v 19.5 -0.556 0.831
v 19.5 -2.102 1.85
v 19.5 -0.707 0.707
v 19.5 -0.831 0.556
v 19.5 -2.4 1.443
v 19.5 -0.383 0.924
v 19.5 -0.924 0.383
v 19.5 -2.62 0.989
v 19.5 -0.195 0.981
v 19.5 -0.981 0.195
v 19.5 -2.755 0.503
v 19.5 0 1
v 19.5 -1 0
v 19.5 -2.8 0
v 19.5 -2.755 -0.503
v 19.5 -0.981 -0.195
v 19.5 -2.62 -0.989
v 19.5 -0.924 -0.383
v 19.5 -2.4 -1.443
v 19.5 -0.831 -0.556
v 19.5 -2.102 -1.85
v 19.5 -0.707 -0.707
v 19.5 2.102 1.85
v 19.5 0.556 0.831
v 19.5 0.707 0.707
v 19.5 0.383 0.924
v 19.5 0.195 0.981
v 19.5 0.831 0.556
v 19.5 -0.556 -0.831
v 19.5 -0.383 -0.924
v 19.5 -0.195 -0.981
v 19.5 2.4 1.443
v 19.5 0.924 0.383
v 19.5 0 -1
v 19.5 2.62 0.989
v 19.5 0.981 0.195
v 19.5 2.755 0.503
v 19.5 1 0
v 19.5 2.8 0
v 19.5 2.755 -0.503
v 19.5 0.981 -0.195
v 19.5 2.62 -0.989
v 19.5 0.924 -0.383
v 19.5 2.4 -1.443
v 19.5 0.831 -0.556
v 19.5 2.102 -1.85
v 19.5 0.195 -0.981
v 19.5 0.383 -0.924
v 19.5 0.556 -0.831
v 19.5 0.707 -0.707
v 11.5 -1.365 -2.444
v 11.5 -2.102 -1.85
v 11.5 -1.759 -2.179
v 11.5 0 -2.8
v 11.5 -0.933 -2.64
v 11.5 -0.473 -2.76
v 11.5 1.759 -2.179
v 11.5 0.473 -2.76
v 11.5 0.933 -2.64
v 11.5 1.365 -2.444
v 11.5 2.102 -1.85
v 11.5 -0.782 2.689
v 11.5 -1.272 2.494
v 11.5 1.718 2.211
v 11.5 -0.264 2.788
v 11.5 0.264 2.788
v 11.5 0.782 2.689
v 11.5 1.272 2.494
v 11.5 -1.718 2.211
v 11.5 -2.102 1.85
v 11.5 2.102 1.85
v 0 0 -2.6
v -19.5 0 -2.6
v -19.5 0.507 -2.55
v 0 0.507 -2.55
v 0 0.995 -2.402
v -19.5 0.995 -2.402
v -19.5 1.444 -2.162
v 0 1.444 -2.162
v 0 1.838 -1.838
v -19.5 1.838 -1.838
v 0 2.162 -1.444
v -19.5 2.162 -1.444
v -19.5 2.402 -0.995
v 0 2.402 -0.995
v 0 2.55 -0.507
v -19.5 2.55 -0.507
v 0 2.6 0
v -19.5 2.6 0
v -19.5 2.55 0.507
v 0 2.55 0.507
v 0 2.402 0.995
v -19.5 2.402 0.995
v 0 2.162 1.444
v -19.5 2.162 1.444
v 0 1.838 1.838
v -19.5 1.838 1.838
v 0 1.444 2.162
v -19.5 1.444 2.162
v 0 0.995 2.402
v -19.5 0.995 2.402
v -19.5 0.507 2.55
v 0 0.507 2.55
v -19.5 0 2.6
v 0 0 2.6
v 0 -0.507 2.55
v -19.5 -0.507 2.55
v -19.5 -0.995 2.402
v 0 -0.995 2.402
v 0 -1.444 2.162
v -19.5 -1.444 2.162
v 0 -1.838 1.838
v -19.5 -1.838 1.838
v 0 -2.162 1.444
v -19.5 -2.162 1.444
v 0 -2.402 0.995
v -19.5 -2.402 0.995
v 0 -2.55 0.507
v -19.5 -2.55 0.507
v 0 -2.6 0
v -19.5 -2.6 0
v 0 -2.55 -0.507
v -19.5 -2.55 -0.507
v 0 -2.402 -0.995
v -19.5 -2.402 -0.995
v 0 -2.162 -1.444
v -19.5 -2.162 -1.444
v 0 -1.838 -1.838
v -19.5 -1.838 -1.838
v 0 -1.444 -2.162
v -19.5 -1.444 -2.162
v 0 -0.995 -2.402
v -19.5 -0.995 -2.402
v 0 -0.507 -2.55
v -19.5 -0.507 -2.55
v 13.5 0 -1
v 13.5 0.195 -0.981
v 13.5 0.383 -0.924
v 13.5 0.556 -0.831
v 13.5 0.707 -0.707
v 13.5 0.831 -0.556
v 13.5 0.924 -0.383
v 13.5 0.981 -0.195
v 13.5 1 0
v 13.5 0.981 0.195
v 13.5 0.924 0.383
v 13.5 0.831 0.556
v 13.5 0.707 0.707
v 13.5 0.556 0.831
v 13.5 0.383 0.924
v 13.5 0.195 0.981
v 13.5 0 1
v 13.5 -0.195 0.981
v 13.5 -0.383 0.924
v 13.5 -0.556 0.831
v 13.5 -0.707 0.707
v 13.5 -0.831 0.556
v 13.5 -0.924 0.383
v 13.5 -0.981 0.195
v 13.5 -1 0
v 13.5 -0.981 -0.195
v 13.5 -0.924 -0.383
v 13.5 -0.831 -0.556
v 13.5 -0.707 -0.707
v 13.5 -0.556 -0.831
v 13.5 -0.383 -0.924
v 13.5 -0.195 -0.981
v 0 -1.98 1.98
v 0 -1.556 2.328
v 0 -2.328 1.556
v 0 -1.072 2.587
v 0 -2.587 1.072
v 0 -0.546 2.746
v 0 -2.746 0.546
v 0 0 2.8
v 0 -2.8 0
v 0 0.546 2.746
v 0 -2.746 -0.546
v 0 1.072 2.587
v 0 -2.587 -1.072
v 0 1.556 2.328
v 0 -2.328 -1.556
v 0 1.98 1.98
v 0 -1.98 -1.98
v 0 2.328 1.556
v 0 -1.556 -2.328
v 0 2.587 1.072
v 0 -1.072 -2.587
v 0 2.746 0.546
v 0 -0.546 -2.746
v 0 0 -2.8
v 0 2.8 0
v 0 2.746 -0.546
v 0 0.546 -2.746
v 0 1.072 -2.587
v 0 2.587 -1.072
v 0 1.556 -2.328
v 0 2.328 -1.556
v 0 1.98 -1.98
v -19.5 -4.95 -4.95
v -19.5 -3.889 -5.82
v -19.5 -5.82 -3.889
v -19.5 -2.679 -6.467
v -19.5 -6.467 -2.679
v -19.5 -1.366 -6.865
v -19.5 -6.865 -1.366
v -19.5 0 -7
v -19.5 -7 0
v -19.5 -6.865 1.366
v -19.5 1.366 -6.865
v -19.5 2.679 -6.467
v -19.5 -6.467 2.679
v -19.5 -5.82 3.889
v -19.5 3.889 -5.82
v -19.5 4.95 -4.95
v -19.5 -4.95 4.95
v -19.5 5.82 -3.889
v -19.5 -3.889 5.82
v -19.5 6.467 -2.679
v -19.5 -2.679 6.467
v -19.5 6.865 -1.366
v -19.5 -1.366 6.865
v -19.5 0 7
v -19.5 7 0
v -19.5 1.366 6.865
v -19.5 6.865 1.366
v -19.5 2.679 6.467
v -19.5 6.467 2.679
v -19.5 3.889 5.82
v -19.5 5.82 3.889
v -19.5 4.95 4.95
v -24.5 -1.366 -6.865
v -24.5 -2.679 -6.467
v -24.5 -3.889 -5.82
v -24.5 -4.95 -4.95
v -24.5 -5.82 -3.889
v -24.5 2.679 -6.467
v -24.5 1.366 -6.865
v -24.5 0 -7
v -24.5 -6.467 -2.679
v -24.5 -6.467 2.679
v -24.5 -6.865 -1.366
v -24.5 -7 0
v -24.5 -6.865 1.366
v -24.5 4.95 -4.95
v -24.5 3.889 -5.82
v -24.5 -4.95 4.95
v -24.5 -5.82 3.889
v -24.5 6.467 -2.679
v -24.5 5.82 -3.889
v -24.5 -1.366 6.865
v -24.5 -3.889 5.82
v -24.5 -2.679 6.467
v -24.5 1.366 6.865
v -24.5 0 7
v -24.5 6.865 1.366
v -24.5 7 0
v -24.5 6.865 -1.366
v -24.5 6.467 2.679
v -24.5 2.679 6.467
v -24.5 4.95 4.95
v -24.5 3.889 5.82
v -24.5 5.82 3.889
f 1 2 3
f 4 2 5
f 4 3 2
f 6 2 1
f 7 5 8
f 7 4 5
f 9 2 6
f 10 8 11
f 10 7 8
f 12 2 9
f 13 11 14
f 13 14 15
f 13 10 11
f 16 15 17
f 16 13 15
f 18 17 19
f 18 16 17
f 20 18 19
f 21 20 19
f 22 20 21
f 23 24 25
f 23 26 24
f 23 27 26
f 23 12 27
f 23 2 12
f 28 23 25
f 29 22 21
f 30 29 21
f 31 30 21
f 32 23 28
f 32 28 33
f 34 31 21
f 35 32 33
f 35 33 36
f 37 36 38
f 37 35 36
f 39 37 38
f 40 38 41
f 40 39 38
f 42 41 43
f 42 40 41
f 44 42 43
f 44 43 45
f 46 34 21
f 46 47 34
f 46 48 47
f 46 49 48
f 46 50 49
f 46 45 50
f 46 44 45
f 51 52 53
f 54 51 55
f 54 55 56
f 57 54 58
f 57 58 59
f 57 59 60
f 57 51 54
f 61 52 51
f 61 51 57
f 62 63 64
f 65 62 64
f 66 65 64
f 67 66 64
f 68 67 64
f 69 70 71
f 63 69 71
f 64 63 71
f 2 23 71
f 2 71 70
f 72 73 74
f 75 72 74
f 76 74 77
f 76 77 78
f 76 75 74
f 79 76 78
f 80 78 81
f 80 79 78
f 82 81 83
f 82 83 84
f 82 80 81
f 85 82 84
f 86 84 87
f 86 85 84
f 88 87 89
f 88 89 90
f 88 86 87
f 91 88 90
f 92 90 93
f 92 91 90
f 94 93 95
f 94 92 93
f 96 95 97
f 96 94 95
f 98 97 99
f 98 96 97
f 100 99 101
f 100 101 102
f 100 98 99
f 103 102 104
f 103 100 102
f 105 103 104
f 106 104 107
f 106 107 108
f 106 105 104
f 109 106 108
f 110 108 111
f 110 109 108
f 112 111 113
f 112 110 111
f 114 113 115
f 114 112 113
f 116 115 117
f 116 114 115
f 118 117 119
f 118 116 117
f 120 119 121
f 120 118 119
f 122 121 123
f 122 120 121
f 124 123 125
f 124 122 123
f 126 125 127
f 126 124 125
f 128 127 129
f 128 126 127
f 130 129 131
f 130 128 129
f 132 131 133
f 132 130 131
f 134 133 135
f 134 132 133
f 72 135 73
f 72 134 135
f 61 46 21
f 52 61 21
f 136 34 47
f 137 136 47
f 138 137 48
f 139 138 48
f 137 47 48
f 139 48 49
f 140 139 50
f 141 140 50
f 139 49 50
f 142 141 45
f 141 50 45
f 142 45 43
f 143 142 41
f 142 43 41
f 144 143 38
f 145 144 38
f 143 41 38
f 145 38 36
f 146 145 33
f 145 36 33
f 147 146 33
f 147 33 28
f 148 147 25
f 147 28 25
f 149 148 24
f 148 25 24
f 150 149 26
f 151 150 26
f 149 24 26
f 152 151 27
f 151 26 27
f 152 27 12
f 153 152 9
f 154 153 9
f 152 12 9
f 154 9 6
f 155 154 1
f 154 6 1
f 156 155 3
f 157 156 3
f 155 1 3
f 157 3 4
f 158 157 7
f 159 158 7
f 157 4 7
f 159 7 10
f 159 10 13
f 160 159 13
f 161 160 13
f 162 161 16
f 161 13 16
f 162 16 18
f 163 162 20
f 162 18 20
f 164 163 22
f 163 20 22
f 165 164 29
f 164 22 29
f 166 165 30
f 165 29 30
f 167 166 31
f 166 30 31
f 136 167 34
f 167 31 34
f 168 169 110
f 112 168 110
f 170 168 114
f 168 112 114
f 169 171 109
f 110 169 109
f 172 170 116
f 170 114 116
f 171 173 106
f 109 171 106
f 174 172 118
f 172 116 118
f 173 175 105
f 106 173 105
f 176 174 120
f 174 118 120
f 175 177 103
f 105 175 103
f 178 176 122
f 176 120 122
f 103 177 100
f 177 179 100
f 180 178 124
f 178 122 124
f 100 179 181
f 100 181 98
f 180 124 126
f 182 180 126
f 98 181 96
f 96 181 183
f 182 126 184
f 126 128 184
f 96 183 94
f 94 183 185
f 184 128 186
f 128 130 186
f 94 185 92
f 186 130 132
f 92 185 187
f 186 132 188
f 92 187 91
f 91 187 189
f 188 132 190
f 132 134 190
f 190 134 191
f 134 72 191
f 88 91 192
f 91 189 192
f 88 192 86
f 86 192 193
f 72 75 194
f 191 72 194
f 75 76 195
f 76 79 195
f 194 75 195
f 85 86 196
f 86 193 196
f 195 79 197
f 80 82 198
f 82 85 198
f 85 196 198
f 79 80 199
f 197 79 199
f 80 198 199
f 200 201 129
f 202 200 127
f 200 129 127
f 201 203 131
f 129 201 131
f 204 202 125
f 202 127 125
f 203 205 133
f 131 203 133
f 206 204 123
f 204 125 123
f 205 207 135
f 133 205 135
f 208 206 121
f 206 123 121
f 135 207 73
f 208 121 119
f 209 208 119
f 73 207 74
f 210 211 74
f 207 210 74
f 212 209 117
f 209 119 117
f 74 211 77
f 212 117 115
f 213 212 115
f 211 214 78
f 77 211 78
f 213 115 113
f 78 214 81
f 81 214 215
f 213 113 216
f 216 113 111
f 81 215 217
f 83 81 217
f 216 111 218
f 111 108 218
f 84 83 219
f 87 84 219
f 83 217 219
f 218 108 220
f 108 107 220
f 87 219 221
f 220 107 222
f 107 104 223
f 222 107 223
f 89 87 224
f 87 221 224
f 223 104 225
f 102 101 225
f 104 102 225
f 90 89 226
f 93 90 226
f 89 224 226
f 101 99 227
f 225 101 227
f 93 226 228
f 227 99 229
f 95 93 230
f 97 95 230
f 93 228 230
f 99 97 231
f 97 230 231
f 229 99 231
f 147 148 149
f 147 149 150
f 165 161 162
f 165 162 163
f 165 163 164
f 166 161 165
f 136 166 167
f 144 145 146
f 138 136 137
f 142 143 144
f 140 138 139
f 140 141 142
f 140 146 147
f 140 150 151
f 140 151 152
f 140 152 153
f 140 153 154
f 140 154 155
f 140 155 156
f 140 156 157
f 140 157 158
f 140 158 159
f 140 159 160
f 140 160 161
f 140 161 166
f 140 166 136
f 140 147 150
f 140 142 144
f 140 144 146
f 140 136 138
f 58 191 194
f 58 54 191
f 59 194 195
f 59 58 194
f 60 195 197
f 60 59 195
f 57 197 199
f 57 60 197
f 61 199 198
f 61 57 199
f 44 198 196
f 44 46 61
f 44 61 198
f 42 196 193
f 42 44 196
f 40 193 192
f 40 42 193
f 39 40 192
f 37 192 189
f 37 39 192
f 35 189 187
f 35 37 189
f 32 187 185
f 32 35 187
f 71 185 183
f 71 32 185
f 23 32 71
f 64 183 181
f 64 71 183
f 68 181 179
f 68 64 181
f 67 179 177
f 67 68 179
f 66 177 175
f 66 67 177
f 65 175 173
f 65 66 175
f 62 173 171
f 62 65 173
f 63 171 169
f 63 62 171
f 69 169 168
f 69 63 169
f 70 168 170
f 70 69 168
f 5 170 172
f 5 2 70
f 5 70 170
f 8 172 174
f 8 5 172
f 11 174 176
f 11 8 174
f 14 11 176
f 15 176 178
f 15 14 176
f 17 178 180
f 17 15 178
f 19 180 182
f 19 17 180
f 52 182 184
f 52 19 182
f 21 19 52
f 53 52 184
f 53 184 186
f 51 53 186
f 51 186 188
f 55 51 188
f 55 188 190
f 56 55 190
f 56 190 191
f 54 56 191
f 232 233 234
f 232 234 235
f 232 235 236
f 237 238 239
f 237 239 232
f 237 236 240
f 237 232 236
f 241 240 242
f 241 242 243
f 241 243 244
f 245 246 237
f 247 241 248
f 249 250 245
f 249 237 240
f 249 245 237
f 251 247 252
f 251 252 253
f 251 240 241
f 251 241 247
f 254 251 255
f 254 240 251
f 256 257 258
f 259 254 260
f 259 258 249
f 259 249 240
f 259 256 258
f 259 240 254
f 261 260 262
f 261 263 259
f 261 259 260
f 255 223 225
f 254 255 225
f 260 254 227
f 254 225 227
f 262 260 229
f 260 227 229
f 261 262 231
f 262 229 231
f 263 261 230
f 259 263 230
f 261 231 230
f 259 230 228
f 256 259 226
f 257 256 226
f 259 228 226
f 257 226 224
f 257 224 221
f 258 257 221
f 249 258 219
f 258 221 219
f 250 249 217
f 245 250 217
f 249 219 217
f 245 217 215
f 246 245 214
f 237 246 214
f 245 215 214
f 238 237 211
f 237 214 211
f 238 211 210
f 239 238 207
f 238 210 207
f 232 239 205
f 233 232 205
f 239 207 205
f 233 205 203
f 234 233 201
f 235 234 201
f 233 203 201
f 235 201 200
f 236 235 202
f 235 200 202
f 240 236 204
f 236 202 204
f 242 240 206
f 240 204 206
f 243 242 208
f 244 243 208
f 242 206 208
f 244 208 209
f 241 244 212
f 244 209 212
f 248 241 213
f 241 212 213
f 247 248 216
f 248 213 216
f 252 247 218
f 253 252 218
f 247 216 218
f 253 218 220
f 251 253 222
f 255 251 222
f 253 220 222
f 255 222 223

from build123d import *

# Parameters (mm, degrees)
SKETCH1_R           = 2.8
BOSS_EXTRUDE1_DEPTH = 19.5
CUT_EXTRUDE1_DEPTH  = 8
SKETCH3_R           = 1
CUT_EXTRUDE2_DEPTH  = 6
SKETCH5_R           = 7
BOSS_EXTRUDE2_DEPTH = 5
SKETCH7_R           = 2.9
SKETCH7_R_2         = 2.6
CUT_EXTRUDE3_DEPTH  = 19.5


with BuildPart() as part:
    # Sketch1 → Boss-Extrude1 (new, symmetric)
    with BuildSketch(Plane(origin=(0, 0, 0), x_dir=(0, 0, -1), z_dir=(1, 0, 0))):
        Circle(SKETCH1_R)
    extrude(amount=BOSS_EXTRUDE1_DEPTH, both=True)

    # Sketch2 → Cut-Extrude1 (cut)
    with BuildSketch(Plane(origin=(19.5, 0, 0), x_dir=(0, 0, -1), z_dir=(1, 0, 0))):
        with BuildLine():
            Line((-1.85, 2.101784956), (-1.85, -2.101784956))
            ThreePointArc((-1.85, -2.101784956), (-2.8, 0), (-1.85, 2.101784956))
        make_face()
        with BuildLine():
            Line((1.85, 2.101784956), (1.85, -2.101784956))
            ThreePointArc((1.85, -2.101784956), (2.8, 0), (1.85, 2.101784956))
        make_face()
    extrude(amount=-CUT_EXTRUDE1_DEPTH, mode=Mode.SUBTRACT)

    # Sketch3 → Cut-Extrude2 (cut)
    with BuildSketch(Plane(origin=(19.5, 0, 0), x_dir=(0, 0, -1), z_dir=(1, 0, 0))):
        Circle(SKETCH3_R)
    extrude(amount=-CUT_EXTRUDE2_DEPTH, mode=Mode.SUBTRACT)

    # Sketch5 → Boss-Extrude2 (add)
    with BuildSketch(Plane.ZY.offset(19.5)):
        Circle(SKETCH5_R)
    extrude(amount=BOSS_EXTRUDE2_DEPTH)

    # Sketch7 → Cut-Extrude3 (cut)
    with BuildSketch(Plane(origin=(0, 0, 0), x_dir=(0, 0, -1), z_dir=(1, 0, 0))):
        Circle(SKETCH7_R)
        Circle(SKETCH7_R_2, mode=Mode.SUBTRACT)
    extrude(amount=-CUT_EXTRUDE3_DEPTH, mode=Mode.SUBTRACT)


solid = part.part
